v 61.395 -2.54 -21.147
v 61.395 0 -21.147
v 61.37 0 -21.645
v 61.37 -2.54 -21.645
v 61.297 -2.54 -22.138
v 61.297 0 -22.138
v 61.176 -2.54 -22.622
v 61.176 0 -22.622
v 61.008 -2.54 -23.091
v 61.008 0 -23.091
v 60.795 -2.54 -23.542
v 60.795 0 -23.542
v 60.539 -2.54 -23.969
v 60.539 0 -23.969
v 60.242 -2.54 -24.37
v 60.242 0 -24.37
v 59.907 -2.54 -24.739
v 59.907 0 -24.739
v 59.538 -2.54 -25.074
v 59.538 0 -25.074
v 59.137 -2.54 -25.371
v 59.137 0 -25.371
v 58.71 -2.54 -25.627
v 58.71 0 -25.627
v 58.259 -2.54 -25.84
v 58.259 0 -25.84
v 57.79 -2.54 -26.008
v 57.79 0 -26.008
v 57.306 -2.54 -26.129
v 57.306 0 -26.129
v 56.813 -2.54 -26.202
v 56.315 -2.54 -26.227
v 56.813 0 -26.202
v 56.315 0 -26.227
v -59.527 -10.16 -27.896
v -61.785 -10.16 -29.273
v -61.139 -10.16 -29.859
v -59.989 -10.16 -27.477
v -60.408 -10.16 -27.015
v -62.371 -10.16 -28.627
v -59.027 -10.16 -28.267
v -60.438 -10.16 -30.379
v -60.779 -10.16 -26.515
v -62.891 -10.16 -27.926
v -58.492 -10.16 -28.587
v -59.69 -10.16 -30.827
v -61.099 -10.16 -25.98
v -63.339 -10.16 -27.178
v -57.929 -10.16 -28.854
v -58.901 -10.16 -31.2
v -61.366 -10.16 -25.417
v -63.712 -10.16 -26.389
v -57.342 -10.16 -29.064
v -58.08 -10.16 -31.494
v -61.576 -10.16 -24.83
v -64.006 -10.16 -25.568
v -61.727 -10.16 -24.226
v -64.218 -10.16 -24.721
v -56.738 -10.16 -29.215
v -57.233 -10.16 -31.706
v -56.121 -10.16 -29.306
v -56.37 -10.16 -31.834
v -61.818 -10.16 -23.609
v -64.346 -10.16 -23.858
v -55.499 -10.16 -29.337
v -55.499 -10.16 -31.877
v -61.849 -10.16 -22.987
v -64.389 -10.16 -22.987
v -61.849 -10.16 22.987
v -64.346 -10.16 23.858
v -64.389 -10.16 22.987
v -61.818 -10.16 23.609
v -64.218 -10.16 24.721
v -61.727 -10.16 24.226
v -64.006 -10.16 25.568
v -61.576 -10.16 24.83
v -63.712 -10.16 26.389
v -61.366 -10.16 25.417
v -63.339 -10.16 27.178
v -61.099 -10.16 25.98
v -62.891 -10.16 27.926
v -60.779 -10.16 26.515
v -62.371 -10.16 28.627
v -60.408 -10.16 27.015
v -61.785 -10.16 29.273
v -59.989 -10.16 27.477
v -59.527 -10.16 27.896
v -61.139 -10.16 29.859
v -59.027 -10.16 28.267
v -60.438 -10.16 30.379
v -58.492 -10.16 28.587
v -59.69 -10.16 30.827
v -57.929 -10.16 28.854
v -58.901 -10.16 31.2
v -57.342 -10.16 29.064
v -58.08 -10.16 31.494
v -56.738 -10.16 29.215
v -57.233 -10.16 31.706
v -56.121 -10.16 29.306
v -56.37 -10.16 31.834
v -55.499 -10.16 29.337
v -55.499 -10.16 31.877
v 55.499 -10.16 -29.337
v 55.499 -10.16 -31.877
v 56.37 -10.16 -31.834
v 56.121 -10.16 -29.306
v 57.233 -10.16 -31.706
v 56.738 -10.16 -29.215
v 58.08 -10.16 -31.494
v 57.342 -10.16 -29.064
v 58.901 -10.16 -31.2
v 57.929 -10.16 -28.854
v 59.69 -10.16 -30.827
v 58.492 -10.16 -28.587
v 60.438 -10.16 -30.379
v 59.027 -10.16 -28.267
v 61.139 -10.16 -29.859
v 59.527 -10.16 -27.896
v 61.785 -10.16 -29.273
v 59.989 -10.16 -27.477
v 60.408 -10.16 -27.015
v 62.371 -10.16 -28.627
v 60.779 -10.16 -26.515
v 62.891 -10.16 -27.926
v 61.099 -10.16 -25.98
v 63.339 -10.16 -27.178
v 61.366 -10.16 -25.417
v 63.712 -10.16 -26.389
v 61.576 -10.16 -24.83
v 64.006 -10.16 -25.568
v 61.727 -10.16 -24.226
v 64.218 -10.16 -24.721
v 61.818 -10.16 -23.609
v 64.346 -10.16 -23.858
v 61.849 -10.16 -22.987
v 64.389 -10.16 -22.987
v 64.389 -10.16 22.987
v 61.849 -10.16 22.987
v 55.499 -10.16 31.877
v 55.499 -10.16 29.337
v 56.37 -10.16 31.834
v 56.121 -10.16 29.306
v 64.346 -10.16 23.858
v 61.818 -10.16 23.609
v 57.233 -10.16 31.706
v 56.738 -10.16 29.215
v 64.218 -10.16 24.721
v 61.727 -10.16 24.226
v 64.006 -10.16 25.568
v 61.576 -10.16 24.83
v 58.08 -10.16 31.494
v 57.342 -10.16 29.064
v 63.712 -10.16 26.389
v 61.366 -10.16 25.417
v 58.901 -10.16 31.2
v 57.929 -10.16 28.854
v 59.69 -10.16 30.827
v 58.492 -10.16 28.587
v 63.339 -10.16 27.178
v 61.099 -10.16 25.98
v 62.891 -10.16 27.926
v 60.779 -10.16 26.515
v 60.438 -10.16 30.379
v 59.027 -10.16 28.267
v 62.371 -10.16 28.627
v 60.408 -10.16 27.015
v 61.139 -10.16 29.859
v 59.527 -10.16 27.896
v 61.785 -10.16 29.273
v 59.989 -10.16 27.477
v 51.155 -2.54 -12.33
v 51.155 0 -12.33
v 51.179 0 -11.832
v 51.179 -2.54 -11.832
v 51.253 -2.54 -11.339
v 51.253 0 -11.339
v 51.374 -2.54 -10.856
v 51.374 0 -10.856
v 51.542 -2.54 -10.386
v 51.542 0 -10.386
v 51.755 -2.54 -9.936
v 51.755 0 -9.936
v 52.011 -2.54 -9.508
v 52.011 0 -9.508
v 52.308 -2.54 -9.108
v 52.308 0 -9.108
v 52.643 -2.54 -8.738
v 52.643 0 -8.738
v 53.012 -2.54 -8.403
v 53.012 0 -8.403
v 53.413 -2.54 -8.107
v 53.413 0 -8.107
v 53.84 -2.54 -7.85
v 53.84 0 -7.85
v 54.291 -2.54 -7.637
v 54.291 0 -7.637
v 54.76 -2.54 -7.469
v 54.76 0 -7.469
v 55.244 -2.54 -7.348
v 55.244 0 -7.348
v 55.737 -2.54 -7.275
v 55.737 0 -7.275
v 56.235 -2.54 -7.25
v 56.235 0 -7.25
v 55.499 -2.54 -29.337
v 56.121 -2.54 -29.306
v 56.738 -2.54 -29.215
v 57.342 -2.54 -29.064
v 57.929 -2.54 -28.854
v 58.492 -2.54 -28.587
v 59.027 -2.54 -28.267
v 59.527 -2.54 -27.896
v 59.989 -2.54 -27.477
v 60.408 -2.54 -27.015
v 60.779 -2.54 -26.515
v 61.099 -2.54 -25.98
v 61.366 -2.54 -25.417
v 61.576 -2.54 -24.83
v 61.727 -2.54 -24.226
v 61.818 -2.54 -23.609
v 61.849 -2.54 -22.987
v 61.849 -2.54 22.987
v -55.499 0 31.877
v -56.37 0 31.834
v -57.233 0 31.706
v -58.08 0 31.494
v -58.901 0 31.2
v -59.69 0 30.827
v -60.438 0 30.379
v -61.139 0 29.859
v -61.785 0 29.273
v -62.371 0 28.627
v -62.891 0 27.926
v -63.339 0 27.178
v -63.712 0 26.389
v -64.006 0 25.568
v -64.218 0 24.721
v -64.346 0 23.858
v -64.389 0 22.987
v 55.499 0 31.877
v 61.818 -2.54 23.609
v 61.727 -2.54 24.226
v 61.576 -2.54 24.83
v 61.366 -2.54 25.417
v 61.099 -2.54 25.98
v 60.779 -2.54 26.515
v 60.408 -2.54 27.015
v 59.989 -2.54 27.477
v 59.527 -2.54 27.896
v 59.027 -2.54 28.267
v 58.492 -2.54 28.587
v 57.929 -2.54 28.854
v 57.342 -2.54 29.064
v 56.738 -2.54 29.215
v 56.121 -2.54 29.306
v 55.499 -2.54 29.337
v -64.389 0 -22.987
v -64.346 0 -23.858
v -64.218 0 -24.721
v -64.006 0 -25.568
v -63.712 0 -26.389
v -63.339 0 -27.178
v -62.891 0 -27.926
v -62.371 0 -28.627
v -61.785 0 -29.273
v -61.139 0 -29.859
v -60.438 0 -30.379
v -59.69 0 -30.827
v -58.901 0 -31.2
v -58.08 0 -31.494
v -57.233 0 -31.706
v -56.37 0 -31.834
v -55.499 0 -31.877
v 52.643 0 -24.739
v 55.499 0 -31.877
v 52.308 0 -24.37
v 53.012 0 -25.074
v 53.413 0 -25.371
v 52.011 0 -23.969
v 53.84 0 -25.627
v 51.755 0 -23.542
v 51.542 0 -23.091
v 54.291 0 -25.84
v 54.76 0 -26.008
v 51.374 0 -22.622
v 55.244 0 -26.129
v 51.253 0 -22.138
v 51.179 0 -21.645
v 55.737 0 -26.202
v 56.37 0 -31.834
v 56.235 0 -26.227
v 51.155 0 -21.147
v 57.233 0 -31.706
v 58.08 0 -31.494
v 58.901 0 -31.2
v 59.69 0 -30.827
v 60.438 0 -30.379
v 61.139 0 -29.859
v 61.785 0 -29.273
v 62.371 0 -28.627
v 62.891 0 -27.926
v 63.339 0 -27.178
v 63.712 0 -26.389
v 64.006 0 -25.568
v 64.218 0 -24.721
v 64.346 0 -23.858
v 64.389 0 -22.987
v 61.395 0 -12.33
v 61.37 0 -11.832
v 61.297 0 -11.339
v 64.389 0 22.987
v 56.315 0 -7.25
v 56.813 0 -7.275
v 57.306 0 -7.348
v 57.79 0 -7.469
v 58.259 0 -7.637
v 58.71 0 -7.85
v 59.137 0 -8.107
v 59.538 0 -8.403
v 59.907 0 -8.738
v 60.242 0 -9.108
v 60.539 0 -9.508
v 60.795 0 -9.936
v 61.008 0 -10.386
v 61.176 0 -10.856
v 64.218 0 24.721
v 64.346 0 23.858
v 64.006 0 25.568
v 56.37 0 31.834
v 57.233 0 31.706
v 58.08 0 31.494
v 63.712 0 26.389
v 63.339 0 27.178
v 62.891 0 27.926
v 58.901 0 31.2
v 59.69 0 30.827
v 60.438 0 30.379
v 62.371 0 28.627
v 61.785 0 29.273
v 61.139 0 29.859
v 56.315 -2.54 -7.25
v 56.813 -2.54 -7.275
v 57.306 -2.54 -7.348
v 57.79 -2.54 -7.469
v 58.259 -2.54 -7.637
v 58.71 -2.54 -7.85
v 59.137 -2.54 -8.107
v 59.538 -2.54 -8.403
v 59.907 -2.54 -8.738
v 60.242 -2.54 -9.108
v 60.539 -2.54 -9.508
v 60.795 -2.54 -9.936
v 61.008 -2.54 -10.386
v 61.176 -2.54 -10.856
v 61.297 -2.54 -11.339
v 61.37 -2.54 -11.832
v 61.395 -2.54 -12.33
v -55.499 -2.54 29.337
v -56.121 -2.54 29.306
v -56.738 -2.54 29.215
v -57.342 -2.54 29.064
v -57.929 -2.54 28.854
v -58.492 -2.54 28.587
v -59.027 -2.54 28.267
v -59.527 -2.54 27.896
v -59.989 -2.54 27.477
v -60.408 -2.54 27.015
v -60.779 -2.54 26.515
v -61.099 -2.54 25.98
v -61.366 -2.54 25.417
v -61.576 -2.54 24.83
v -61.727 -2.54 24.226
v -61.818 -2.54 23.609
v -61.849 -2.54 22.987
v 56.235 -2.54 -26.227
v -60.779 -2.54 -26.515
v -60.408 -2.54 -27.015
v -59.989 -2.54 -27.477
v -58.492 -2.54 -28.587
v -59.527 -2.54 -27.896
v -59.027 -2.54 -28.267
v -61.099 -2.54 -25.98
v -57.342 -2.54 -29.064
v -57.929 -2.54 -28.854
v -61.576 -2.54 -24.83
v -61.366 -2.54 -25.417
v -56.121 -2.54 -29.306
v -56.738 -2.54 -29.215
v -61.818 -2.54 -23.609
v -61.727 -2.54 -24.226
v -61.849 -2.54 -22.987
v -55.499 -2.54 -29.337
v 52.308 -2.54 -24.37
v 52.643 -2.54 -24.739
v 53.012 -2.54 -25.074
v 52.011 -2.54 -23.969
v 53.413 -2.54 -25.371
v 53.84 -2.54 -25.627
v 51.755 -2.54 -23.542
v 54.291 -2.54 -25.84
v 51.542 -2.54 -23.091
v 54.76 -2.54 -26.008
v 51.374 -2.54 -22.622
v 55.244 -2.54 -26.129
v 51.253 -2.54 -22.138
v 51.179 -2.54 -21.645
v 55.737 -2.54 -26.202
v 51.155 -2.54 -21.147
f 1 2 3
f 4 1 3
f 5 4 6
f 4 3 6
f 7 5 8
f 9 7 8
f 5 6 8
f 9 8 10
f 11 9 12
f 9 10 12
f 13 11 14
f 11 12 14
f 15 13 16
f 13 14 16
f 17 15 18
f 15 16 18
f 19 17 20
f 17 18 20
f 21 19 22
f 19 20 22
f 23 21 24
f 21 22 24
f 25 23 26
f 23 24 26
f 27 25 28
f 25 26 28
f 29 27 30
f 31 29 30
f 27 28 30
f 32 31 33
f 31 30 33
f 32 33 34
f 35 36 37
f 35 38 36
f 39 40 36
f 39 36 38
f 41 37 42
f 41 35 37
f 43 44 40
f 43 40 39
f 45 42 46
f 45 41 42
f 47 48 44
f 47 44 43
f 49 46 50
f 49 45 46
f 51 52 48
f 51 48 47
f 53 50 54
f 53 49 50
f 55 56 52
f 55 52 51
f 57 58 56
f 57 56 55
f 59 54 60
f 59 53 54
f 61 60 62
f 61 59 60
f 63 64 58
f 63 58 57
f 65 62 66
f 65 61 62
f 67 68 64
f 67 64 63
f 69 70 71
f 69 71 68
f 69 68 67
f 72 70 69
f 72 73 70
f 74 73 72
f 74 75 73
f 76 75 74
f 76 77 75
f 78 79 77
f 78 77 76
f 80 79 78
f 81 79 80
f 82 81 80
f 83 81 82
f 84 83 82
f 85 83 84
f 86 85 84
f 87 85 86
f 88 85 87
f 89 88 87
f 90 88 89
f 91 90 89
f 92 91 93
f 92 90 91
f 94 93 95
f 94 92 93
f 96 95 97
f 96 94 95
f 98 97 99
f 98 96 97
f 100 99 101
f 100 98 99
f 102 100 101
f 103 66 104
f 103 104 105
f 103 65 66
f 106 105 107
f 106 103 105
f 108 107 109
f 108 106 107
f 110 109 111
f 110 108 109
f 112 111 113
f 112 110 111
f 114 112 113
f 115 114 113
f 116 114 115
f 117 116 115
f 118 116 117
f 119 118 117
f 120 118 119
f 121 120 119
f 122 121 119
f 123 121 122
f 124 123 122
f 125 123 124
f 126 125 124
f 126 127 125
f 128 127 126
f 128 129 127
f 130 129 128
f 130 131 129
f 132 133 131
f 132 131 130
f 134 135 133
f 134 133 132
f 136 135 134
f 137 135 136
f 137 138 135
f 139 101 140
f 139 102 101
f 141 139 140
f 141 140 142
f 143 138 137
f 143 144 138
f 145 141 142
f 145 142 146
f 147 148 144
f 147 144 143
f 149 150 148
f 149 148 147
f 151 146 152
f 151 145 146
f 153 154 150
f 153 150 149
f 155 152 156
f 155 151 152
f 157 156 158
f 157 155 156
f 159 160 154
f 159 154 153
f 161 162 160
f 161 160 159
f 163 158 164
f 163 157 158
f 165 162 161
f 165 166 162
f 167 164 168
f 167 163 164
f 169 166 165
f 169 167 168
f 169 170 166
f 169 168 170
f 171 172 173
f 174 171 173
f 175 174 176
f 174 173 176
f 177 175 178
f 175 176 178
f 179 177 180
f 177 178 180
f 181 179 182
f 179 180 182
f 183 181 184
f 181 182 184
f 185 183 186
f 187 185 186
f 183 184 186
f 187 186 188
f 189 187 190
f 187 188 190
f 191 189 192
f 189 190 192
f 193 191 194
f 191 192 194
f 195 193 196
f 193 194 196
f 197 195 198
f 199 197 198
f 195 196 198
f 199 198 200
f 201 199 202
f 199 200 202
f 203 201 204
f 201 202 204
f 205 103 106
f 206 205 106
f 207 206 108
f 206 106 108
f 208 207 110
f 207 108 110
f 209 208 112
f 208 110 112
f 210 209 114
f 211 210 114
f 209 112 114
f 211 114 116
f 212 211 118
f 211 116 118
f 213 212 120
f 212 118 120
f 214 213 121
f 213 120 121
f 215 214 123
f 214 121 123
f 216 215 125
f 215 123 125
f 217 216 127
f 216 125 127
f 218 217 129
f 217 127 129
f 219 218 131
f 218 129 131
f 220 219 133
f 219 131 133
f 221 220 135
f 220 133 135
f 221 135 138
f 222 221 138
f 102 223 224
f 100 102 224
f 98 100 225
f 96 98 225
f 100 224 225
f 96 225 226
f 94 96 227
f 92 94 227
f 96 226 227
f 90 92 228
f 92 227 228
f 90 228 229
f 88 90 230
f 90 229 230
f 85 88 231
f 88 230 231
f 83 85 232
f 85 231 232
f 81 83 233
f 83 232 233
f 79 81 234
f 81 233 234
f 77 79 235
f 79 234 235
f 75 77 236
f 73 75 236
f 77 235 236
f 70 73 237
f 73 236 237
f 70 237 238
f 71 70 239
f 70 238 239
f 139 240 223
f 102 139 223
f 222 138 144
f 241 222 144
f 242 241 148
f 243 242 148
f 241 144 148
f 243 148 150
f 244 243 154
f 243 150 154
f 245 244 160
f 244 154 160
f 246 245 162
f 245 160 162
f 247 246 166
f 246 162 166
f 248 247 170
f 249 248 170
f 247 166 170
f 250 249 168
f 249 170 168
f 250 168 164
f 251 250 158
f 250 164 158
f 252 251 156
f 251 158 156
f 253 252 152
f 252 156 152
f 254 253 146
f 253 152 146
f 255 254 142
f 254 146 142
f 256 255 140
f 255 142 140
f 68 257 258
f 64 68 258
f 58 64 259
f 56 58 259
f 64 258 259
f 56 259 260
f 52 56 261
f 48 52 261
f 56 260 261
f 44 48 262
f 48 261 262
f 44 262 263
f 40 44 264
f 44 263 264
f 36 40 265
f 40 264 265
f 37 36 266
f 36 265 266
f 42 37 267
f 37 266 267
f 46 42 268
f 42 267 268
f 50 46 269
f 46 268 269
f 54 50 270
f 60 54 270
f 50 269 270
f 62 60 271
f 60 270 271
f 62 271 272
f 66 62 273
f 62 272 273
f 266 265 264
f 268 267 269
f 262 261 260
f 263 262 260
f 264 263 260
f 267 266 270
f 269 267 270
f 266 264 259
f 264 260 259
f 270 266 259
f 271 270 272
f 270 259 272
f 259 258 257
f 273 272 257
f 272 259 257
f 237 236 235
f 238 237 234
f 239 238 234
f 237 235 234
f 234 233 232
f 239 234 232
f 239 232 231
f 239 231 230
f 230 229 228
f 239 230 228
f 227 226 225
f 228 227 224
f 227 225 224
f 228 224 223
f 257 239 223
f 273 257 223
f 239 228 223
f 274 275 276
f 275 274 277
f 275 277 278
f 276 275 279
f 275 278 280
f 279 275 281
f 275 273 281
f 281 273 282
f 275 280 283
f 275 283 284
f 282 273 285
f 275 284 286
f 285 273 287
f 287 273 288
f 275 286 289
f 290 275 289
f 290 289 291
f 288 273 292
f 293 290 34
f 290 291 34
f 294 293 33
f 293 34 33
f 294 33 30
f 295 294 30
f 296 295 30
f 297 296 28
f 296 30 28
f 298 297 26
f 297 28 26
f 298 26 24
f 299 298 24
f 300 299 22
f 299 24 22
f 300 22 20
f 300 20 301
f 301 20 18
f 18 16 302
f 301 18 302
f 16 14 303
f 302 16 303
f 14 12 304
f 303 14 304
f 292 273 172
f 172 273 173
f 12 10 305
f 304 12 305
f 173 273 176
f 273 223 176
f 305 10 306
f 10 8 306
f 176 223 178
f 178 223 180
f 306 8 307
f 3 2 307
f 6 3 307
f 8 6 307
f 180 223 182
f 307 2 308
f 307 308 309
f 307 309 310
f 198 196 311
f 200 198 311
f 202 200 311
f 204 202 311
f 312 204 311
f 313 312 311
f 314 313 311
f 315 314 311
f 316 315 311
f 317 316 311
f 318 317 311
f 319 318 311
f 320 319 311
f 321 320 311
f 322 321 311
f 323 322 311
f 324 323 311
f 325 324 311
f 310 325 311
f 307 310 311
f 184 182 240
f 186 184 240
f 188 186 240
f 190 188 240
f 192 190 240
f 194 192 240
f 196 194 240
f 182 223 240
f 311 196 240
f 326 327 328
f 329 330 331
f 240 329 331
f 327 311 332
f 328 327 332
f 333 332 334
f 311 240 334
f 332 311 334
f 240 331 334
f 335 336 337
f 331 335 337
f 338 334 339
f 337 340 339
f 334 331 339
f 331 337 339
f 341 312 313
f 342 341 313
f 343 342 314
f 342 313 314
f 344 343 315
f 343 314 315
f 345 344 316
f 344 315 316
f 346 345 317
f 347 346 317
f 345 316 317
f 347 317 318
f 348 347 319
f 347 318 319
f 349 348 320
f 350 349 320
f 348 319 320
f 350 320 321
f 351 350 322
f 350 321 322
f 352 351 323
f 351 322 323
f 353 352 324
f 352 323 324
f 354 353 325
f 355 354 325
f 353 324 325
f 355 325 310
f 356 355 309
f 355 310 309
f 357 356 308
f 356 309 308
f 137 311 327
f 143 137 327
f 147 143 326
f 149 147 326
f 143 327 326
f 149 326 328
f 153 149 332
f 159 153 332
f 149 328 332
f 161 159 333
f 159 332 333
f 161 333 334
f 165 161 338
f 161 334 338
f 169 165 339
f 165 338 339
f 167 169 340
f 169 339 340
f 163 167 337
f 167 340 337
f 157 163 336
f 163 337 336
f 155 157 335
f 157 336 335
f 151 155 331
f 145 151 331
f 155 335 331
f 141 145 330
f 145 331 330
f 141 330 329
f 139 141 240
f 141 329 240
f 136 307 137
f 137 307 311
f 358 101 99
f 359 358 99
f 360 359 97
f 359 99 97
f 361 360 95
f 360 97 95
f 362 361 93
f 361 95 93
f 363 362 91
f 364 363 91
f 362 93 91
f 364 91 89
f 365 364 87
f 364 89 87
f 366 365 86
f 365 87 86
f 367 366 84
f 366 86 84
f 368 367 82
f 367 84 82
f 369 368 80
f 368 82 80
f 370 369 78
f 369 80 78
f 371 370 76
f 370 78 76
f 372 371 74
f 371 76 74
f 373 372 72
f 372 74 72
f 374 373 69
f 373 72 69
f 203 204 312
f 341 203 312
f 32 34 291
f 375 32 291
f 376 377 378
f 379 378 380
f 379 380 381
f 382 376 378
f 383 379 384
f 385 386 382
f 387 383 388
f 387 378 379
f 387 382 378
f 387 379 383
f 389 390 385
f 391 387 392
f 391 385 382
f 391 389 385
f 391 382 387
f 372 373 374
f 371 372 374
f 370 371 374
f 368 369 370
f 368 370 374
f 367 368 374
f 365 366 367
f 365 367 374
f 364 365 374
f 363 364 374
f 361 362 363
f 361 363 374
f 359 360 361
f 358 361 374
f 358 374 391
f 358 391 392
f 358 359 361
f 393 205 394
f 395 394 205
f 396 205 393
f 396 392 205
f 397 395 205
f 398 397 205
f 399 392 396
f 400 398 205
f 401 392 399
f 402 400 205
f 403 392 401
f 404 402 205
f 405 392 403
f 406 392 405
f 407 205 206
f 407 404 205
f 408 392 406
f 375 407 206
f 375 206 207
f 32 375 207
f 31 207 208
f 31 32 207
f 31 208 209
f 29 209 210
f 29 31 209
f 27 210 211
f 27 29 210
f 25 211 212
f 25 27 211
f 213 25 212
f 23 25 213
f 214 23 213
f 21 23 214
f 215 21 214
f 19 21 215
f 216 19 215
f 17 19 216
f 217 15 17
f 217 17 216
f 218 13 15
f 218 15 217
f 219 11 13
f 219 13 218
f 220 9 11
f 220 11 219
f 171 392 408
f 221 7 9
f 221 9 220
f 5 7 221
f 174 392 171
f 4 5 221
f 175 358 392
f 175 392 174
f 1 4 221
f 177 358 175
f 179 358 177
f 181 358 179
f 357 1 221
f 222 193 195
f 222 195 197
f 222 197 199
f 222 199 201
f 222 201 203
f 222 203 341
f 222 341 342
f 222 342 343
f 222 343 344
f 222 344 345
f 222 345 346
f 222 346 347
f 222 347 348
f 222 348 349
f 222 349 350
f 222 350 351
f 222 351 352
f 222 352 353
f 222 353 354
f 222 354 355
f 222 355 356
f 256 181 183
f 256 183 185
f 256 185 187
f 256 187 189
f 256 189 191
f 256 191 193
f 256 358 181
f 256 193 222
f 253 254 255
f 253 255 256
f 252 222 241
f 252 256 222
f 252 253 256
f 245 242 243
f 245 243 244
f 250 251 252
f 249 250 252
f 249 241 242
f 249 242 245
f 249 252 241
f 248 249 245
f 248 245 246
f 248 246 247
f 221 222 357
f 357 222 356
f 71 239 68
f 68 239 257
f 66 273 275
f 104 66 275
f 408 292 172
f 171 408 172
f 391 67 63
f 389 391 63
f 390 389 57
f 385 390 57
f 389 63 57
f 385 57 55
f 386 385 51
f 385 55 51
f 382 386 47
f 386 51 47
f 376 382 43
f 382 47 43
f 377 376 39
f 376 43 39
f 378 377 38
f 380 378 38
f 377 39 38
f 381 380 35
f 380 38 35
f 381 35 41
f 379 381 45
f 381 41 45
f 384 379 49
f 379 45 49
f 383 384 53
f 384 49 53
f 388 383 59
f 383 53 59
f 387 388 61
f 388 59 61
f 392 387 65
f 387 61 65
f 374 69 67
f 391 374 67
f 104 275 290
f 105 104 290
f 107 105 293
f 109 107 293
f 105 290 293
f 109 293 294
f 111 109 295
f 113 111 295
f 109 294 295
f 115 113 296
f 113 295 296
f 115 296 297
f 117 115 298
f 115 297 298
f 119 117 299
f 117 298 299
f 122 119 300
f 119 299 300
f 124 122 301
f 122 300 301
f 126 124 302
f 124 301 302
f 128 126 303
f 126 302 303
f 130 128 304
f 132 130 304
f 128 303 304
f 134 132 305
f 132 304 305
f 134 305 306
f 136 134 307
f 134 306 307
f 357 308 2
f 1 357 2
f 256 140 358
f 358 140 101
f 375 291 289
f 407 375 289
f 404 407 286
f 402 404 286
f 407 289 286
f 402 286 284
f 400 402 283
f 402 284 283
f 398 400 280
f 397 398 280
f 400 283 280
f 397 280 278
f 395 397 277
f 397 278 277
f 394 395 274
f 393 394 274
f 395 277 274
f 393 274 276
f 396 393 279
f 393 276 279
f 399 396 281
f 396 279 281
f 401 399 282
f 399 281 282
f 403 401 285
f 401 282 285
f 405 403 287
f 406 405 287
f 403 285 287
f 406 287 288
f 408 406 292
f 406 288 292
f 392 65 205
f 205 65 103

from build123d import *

# Parameters (mm, degrees)
F1_DEPTH = 10.16
F3_DEPTH = 7.62
F5_DEPTH = 25.4


with BuildPart() as f1:
    # F0 (on Front) → F1 (new body)
    with BuildSketch(Plane.XZ):
        with BuildLine():
            Line((55.499, 31.877), (-55.499, 31.877))
            ThreePointArc((-55.499, 31.877), (-61.785179, 29.273179), (-64.389, 22.987))
            Line((-64.389, 22.987), (-64.389, -22.987))
            ThreePointArc((-64.389, -22.987), (-61.785179, -29.273179), (-55.499, -31.877))
            Line((-55.499, -31.877), (55.499, -31.877))
            ThreePointArc((55.499, -31.877), (61.785179, -29.273179), (64.389, -22.987))
            Line((64.389, -22.987), (64.389, 22.987))
            ThreePointArc((64.389, 22.987), (61.785179, 29.273179), (55.499, 31.877))
        make_face()
    extrude(amount=F1_DEPTH)

    # F2 (on face) → F3 (cut)
    with BuildSketch(Plane.XZ.offset(10.16)):
        with BuildLine():
            Line((55.499, 29.337), (-55.499, 29.337))
            ThreePointArc((-55.499, 29.337), (-59.989128, 27.477128), (-61.849, 22.987))
            Line((-61.849, 22.987), (-61.849, -22.987))
            ThreePointArc((-61.849, -22.987), (-59.989128, -27.477128), (-55.499, -29.337))
            Line((-55.499, -29.337), (55.499, -29.337))
            ThreePointArc((55.499, -29.337), (59.989128, -27.477128), (61.849, -22.987))
            Line((61.849, -22.987), (61.849, 22.987))
            ThreePointArc((61.849, 22.987), (59.989128, 27.477128), (55.499, 29.337))
        make_face()
    extrude(amount=-F3_DEPTH, mode=Mode.SUBTRACT)

    # F4 (on face) → F5 (cut)
    with BuildSketch(Plane(origin=(0, 0, 0), x_dir=(-1, 0, 0), z_dir=(0, 1, 0))):
        with BuildLine():
            ThreePointArc((-61.394893, -21.146874), (-59.906995, -24.738976), (-56.314893, -26.226874))
            Line((-56.314893, -26.226874), (-56.235034, -26.226874))
            ThreePointArc((-56.235034, -26.226874), (-52.642932, -24.738976), (-51.155034, -21.146874))
            Line((-51.155034, -21.146874), (-51.155034, -12.330383))
            ThreePointArc((-51.155034, -12.330383), (-52.642932, -8.738281), (-56.235034, -7.250383))
            Line((-56.235034, -7.250383), (-56.314893, -7.250383))
            ThreePointArc((-56.314893, -7.250383), (-59.906995, -8.738281), (-61.394893, -12.330383))
            Line((-61.394893, -12.330383), (-61.394893, -21.146874))
        make_face()
    extrude(amount=-F5_DEPTH, mode=Mode.SUBTRACT)


solid = f1.part
